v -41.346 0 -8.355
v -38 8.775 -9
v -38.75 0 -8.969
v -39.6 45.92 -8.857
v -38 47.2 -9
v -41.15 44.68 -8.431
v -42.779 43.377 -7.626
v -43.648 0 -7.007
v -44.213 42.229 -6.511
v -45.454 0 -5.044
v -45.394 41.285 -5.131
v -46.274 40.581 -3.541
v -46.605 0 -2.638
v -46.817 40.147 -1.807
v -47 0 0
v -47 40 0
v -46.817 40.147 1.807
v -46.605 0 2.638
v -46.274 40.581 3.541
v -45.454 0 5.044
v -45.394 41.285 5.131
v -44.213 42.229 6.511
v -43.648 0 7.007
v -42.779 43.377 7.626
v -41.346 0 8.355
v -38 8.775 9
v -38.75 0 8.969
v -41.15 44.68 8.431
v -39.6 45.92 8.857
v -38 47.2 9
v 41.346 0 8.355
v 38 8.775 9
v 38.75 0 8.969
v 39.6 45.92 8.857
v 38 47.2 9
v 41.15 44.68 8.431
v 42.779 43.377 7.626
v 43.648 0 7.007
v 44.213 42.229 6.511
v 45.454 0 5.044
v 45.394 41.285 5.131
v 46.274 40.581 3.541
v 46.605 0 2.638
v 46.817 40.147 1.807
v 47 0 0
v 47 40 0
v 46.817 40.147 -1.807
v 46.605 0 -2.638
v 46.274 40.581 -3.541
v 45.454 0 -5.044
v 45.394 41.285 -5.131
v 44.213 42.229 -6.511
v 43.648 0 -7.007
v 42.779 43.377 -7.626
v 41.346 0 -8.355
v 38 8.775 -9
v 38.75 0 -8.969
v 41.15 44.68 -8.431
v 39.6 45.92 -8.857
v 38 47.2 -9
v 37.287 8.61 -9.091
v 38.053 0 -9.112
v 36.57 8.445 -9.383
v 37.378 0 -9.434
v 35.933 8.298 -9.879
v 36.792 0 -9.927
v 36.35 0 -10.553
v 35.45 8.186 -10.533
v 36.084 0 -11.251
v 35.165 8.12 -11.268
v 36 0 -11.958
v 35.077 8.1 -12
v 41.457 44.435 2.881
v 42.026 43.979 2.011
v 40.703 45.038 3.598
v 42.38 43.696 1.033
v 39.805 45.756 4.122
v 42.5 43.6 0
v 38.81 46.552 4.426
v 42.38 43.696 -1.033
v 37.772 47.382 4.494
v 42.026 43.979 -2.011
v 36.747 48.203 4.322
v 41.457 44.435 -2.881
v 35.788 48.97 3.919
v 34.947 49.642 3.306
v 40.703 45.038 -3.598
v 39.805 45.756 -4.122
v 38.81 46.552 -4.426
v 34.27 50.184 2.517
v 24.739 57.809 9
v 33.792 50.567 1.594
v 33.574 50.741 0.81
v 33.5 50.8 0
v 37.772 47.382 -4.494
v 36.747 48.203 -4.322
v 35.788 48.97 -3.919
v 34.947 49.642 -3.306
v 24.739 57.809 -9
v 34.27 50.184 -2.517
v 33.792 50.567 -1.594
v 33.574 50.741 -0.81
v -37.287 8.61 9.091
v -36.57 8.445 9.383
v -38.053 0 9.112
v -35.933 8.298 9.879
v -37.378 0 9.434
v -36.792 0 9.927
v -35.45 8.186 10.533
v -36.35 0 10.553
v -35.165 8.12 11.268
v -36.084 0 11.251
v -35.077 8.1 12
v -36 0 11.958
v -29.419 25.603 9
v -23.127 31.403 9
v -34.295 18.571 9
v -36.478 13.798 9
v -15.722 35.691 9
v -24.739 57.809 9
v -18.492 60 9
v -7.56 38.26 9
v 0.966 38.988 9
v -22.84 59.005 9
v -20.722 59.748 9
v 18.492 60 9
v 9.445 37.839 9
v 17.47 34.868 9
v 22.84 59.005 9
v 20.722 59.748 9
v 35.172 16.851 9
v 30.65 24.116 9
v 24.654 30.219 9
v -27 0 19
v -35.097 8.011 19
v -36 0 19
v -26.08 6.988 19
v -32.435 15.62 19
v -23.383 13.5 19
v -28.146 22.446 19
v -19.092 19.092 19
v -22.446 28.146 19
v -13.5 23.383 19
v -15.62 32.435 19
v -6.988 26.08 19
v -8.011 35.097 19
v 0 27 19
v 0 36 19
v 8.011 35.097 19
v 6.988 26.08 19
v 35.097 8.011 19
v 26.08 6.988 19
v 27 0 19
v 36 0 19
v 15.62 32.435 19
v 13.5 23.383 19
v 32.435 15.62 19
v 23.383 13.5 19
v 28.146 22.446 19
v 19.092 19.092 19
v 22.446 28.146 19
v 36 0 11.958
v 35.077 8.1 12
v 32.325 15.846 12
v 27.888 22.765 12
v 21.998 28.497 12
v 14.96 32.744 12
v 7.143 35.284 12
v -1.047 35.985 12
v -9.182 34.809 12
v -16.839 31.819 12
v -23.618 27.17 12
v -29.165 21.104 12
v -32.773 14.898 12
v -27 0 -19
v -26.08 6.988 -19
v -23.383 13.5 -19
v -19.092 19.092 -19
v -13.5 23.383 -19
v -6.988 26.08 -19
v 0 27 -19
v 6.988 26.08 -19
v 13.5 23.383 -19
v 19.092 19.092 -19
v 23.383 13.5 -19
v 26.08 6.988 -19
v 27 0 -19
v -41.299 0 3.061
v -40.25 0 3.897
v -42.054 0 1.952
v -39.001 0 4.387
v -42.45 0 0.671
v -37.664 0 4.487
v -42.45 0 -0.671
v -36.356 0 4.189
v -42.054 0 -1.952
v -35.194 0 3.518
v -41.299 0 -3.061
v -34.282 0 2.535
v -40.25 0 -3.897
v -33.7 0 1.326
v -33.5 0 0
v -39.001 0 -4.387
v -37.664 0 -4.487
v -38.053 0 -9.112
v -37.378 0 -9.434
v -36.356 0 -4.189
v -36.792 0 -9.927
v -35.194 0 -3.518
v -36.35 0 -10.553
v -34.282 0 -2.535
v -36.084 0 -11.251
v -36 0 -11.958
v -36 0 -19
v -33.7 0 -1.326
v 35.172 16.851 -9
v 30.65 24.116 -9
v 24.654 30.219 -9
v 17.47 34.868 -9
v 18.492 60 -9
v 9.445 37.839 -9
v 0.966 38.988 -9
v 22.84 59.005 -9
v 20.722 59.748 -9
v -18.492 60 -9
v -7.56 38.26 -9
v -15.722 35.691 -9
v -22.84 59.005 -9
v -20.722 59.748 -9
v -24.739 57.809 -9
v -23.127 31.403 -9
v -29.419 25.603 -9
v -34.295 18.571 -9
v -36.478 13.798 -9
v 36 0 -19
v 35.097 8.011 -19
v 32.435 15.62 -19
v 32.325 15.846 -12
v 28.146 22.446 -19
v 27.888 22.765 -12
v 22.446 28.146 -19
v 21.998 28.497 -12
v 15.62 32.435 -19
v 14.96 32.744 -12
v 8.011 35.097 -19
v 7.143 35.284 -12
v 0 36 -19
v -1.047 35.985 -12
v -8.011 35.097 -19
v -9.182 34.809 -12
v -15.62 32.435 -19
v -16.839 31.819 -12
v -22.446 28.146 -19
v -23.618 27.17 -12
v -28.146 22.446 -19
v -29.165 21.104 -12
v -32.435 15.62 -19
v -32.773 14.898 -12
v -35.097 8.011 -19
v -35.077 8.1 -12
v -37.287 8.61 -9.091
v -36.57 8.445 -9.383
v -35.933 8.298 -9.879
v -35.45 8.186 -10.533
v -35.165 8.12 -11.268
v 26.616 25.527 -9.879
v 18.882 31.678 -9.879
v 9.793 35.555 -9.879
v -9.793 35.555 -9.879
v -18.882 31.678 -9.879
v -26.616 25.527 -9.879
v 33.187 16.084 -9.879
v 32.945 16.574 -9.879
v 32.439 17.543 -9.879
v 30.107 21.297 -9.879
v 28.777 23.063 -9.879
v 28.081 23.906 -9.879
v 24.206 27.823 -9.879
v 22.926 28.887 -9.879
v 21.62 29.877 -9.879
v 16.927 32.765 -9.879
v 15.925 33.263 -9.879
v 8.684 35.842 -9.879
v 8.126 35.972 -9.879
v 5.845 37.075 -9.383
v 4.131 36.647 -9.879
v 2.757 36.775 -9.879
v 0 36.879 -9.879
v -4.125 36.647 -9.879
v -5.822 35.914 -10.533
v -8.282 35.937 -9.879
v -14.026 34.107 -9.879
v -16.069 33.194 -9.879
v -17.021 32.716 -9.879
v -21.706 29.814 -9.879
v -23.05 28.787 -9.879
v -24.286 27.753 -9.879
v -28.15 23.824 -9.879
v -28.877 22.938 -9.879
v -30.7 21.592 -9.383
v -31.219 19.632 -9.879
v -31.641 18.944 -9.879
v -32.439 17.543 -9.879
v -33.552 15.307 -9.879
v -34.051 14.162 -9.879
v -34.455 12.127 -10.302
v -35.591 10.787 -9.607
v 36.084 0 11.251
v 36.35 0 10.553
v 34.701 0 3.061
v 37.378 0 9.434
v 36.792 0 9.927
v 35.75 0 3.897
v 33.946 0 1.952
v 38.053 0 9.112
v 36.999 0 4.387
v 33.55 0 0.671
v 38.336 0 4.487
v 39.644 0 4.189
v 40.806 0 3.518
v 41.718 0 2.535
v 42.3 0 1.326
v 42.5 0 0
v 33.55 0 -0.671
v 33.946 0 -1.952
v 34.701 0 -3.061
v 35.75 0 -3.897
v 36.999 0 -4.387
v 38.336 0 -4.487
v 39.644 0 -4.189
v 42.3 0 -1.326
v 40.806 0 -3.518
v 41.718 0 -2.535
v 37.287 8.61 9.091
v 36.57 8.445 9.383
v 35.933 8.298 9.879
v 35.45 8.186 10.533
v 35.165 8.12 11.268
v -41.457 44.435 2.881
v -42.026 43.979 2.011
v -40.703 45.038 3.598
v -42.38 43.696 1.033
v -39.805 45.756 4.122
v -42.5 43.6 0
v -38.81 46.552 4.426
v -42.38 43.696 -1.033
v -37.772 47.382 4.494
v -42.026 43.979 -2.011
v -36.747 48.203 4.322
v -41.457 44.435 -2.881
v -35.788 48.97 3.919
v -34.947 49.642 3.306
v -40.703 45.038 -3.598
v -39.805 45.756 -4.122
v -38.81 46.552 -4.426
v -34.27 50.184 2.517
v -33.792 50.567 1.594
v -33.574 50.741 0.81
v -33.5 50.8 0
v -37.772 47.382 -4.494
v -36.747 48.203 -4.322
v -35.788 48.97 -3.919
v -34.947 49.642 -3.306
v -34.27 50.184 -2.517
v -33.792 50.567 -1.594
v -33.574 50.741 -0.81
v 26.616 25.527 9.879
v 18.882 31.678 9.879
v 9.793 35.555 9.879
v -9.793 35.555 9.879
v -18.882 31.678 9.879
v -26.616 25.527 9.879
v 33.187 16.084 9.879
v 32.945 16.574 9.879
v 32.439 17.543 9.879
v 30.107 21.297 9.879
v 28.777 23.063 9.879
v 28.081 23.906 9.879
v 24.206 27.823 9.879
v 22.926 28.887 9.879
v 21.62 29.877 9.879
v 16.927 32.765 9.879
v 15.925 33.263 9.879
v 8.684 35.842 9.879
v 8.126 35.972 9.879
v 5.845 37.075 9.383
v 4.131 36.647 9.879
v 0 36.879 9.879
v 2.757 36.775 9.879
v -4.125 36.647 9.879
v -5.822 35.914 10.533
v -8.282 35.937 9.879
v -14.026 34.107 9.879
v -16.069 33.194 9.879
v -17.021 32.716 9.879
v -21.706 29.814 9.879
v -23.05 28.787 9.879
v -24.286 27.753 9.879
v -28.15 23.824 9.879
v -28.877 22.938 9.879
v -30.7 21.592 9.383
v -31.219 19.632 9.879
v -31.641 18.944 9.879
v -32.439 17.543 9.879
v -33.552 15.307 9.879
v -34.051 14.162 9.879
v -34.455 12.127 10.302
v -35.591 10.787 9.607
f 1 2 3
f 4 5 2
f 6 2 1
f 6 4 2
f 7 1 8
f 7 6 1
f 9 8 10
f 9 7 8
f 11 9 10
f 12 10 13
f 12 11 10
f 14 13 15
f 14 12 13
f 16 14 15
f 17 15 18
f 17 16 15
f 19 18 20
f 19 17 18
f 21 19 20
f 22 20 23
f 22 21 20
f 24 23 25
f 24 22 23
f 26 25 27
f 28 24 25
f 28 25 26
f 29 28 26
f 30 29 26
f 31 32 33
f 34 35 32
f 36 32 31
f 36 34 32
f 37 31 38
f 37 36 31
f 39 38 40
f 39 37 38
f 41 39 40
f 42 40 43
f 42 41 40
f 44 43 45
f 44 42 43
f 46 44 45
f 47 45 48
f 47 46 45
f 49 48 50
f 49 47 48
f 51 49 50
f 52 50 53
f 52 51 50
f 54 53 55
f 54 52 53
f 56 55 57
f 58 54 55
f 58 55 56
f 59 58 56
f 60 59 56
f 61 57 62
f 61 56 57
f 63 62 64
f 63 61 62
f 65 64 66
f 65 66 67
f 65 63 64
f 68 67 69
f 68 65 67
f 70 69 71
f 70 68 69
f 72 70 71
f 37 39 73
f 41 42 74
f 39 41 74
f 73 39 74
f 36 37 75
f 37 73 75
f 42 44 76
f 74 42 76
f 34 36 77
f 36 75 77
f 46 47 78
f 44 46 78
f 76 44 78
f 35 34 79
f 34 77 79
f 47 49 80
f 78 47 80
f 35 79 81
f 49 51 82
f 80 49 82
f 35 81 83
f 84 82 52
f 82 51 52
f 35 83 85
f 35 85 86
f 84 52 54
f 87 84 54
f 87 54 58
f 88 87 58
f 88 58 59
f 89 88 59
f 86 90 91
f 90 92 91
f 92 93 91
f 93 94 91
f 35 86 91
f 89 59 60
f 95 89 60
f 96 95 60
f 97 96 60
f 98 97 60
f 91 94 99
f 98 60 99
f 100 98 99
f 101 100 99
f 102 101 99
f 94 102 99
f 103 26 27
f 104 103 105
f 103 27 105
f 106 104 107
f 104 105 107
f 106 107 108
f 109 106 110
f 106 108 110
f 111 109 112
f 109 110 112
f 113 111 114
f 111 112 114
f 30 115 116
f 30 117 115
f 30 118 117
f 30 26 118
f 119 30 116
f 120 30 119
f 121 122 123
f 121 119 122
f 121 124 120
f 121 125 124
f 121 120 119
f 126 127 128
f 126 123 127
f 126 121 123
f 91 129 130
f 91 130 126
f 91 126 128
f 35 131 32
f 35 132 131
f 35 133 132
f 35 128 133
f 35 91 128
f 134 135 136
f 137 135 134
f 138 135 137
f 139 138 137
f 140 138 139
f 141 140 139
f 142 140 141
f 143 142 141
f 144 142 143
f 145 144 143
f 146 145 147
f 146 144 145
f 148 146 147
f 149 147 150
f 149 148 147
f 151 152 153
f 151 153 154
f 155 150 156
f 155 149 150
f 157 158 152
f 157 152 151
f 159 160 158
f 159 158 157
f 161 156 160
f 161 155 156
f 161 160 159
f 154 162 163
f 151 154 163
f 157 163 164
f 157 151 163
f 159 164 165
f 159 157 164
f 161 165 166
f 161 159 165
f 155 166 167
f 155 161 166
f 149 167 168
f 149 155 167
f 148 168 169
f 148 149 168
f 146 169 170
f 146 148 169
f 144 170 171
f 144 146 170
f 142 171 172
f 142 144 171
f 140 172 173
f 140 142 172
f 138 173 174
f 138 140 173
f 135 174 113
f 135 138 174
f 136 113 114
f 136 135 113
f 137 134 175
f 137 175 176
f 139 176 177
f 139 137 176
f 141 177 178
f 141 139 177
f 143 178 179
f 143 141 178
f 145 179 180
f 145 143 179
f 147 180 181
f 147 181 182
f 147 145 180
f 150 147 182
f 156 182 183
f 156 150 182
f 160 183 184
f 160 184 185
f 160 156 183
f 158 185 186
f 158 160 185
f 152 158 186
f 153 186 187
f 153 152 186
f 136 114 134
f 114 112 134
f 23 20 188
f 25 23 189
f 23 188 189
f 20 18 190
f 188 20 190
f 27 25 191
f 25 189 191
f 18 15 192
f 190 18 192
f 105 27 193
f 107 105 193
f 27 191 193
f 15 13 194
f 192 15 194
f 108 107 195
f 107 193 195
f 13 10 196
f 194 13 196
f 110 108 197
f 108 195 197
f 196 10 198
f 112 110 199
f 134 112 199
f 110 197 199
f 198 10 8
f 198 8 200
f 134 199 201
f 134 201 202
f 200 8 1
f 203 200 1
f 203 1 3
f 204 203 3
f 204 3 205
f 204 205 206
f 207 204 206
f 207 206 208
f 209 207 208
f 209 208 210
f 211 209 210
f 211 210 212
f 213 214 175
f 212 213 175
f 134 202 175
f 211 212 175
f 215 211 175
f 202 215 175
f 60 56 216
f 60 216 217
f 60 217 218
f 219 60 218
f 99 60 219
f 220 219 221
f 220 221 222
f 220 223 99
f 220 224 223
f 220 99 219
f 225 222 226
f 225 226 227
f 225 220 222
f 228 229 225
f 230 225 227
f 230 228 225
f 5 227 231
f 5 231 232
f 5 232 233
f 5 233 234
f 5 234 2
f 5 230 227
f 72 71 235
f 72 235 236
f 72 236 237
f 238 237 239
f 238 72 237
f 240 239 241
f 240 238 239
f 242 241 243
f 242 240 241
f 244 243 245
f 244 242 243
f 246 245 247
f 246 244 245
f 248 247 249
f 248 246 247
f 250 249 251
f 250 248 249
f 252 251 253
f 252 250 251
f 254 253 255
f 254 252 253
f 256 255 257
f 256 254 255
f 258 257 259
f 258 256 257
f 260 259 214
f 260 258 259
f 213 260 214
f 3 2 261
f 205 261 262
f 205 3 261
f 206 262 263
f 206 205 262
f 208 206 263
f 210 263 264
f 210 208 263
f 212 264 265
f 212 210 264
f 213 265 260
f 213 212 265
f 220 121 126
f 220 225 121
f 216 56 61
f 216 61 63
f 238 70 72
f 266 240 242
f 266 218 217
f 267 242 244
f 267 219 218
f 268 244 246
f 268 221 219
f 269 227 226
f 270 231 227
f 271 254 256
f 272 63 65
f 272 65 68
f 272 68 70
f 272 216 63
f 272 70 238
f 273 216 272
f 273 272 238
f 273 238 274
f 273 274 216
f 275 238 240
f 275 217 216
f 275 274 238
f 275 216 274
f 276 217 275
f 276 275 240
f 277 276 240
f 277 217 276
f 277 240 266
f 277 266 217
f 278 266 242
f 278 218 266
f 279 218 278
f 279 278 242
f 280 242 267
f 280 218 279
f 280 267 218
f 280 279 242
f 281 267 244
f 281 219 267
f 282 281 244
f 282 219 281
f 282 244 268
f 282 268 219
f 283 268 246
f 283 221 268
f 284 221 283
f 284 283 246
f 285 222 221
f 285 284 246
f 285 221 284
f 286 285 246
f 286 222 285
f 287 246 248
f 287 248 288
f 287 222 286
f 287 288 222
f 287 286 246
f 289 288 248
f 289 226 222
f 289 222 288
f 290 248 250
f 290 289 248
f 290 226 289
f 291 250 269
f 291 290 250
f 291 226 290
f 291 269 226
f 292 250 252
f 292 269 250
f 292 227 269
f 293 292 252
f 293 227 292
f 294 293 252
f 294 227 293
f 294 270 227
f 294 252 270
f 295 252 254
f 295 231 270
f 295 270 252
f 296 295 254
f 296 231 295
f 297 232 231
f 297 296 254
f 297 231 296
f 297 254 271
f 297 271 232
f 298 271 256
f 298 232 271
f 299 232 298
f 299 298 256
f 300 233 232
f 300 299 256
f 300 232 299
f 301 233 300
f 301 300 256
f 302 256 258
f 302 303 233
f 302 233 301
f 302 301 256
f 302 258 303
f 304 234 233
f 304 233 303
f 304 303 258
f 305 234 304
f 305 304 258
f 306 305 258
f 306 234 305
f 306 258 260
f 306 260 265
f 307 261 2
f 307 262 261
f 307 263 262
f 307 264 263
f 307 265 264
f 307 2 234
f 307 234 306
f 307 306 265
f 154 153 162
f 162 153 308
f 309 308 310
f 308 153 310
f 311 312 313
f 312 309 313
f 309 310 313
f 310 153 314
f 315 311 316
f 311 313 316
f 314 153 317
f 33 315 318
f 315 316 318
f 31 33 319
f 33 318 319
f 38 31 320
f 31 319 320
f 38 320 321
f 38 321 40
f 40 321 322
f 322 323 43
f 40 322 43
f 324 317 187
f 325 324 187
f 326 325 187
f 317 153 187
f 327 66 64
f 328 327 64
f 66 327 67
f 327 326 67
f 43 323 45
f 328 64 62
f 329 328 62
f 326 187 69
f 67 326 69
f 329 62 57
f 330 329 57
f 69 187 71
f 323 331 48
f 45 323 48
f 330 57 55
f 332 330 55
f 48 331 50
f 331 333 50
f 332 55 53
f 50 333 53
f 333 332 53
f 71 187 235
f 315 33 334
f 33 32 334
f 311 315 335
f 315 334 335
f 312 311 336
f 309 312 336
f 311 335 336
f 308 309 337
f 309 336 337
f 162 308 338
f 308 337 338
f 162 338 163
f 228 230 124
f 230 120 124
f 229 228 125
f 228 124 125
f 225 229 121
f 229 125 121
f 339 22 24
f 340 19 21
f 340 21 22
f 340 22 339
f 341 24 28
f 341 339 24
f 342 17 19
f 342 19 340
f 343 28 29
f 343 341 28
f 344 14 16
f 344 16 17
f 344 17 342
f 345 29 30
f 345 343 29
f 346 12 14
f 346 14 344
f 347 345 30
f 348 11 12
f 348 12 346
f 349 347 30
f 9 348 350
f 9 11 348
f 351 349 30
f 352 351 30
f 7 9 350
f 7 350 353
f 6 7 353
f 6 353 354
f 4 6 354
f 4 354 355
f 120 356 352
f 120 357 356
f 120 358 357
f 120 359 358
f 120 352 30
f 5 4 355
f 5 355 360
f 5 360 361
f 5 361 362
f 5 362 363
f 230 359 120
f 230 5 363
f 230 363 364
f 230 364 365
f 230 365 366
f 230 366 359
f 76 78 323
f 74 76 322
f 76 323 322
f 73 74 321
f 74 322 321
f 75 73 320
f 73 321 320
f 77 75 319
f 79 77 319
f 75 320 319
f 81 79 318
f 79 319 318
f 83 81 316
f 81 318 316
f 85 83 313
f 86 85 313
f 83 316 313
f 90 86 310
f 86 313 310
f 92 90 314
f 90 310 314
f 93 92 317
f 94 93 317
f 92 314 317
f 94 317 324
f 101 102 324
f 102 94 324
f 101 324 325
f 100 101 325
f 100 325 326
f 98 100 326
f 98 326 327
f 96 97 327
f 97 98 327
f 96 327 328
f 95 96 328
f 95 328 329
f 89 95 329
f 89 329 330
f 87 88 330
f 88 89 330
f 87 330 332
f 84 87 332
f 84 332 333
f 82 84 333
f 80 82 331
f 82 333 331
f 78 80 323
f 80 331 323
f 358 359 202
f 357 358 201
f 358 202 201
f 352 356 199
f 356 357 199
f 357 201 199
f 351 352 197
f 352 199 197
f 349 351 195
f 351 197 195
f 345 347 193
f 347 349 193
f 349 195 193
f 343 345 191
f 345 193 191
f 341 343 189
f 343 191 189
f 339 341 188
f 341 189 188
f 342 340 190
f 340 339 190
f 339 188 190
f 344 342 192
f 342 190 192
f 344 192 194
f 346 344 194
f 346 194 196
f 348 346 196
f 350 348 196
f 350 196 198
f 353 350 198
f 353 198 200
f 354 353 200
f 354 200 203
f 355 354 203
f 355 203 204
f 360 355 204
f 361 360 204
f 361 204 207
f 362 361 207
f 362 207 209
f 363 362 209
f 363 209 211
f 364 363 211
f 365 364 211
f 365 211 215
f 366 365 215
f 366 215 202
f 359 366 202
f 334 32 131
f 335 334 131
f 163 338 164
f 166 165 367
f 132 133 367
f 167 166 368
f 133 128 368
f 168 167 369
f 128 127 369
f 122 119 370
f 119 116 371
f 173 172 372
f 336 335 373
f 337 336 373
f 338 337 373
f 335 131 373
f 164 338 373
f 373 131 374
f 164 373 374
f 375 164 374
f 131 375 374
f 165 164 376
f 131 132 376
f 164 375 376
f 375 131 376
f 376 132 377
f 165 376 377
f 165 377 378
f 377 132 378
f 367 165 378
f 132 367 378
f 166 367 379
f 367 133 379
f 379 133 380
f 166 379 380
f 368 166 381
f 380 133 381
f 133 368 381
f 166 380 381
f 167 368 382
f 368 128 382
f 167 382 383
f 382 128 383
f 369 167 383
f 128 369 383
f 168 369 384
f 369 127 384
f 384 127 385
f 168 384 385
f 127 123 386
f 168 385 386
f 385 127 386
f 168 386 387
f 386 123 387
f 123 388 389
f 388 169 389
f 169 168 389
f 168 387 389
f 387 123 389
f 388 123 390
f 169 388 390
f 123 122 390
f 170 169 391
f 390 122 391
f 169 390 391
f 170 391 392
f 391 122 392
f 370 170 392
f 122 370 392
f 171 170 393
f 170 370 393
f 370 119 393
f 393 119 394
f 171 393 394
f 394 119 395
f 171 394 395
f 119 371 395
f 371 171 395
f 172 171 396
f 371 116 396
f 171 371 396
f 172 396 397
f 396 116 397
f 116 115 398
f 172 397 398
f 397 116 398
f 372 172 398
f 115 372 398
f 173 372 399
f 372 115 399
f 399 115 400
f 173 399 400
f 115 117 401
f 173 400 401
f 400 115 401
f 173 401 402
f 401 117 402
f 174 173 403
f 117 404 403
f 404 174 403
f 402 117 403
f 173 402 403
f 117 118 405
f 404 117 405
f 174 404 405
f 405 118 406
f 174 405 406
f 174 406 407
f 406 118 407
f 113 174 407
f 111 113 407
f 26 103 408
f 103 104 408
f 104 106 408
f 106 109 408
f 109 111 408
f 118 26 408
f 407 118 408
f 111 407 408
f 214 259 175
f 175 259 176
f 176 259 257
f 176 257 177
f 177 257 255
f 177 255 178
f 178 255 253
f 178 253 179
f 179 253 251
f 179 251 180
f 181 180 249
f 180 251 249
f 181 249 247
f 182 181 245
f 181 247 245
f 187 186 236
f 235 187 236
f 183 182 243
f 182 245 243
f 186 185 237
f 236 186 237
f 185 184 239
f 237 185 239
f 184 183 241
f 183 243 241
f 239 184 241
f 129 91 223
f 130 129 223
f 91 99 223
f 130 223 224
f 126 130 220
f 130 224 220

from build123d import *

# Parameters (mm, degrees)
BOSS_EXTRUDE1_DEPTH     = 19
BOSS_EXTRUDE2_DEPTH     = 60
CUT_EXTRUDE1_DEPTH      = 29
SKETCH4_R               = 4.5
CUT_EXTRUDE2_DEPTH      = 61
CUT_EXTRUDE4_DEPTH      = 20
CUT_EXTRUDE4_DEPTH_BACK = 20
FILLET1_R               = 10
FILLET2_R               = 3


with BuildPart() as part:
    # Sketch1 → Boss-Extrude1 (new body, symmetric)
    with BuildSketch(Plane.XY):
        with BuildLine():
            Line((-36, 0), (-27, 0))
            ThreePointArc((-27, 0), (0, 27), (27, 0))
            Line((27, 0), (36, 0))
            ThreePointArc((36, 0), (0, 36), (-36, 0))
        make_face()
    extrude(amount=BOSS_EXTRUDE1_DEPTH, both=True)

    # Sketch2 → Boss-Extrude2 (add)
    with BuildSketch(Plane(origin=(0, 60, 0), x_dir=(-1, 0, 0), z_dir=(0, -1, 0))):
        with BuildLine():
            Line((38, -9), (-38, -9))
            ThreePointArc((-38, -9), (-47, 0), (-38, 9))
            Line((-38, 9), (38, 9))
            ThreePointArc((38, 9), (47, 0), (38, -9))
        make_face()
    extrude(amount=BOSS_EXTRUDE2_DEPTH)

    # Sketch3 → Cut-Extrude1 (cut, through all)
    with BuildSketch(Plane.XY.offset(9)):
        with BuildLine():
            Line((-27, 0), (27, 0))
            ThreePointArc((27, 0), (0, 27), (-27, 0))
        make_face()
    extrude(amount=-CUT_EXTRUDE1_DEPTH, mode=Mode.SUBTRACT)

    # Sketch4 → Cut-Extrude2 (cut, through all)
    with BuildSketch(Plane.XZ):
        with Locations((-38, 0)):
            Circle(SKETCH4_R)
        with Locations((38, 0)):
            Circle(SKETCH4_R)
    extrude(amount=-CUT_EXTRUDE2_DEPTH, mode=Mode.SUBTRACT)

    # Sketch5 → Cut-Extrude4 (cut, two sides)
    with BuildSketch(Plane.XY) as cut_extrude4_sk:
        Polygon((-47, 40), (-22, 60), (-47, 60), align=None)
        Polygon((47, 60), (47, 40), (22, 60), align=None)
    extrude(amount=CUT_EXTRUDE4_DEPTH, mode=Mode.SUBTRACT)
    extrude(cut_extrude4_sk.sketch, amount=-CUT_EXTRUDE4_DEPTH_BACK, mode=Mode.SUBTRACT)

    # Fillet1
    fillet1_edges = [part.edges().sort_by_distance(p)[0] for p in [
        (-22, 60, 0),
        (22, 60, 0),
    ]]
    fillet(fillet1_edges, radius=FILLET1_R)

    # Fillet2
    fillet2_edges = [part.edges().sort_by_distance(p)[0] for p in [
        (0, 36, 9),
        (0, 36, -9),
    ]]
    fillet(fillet2_edges, radius=FILLET2_R)


solid = part.part
